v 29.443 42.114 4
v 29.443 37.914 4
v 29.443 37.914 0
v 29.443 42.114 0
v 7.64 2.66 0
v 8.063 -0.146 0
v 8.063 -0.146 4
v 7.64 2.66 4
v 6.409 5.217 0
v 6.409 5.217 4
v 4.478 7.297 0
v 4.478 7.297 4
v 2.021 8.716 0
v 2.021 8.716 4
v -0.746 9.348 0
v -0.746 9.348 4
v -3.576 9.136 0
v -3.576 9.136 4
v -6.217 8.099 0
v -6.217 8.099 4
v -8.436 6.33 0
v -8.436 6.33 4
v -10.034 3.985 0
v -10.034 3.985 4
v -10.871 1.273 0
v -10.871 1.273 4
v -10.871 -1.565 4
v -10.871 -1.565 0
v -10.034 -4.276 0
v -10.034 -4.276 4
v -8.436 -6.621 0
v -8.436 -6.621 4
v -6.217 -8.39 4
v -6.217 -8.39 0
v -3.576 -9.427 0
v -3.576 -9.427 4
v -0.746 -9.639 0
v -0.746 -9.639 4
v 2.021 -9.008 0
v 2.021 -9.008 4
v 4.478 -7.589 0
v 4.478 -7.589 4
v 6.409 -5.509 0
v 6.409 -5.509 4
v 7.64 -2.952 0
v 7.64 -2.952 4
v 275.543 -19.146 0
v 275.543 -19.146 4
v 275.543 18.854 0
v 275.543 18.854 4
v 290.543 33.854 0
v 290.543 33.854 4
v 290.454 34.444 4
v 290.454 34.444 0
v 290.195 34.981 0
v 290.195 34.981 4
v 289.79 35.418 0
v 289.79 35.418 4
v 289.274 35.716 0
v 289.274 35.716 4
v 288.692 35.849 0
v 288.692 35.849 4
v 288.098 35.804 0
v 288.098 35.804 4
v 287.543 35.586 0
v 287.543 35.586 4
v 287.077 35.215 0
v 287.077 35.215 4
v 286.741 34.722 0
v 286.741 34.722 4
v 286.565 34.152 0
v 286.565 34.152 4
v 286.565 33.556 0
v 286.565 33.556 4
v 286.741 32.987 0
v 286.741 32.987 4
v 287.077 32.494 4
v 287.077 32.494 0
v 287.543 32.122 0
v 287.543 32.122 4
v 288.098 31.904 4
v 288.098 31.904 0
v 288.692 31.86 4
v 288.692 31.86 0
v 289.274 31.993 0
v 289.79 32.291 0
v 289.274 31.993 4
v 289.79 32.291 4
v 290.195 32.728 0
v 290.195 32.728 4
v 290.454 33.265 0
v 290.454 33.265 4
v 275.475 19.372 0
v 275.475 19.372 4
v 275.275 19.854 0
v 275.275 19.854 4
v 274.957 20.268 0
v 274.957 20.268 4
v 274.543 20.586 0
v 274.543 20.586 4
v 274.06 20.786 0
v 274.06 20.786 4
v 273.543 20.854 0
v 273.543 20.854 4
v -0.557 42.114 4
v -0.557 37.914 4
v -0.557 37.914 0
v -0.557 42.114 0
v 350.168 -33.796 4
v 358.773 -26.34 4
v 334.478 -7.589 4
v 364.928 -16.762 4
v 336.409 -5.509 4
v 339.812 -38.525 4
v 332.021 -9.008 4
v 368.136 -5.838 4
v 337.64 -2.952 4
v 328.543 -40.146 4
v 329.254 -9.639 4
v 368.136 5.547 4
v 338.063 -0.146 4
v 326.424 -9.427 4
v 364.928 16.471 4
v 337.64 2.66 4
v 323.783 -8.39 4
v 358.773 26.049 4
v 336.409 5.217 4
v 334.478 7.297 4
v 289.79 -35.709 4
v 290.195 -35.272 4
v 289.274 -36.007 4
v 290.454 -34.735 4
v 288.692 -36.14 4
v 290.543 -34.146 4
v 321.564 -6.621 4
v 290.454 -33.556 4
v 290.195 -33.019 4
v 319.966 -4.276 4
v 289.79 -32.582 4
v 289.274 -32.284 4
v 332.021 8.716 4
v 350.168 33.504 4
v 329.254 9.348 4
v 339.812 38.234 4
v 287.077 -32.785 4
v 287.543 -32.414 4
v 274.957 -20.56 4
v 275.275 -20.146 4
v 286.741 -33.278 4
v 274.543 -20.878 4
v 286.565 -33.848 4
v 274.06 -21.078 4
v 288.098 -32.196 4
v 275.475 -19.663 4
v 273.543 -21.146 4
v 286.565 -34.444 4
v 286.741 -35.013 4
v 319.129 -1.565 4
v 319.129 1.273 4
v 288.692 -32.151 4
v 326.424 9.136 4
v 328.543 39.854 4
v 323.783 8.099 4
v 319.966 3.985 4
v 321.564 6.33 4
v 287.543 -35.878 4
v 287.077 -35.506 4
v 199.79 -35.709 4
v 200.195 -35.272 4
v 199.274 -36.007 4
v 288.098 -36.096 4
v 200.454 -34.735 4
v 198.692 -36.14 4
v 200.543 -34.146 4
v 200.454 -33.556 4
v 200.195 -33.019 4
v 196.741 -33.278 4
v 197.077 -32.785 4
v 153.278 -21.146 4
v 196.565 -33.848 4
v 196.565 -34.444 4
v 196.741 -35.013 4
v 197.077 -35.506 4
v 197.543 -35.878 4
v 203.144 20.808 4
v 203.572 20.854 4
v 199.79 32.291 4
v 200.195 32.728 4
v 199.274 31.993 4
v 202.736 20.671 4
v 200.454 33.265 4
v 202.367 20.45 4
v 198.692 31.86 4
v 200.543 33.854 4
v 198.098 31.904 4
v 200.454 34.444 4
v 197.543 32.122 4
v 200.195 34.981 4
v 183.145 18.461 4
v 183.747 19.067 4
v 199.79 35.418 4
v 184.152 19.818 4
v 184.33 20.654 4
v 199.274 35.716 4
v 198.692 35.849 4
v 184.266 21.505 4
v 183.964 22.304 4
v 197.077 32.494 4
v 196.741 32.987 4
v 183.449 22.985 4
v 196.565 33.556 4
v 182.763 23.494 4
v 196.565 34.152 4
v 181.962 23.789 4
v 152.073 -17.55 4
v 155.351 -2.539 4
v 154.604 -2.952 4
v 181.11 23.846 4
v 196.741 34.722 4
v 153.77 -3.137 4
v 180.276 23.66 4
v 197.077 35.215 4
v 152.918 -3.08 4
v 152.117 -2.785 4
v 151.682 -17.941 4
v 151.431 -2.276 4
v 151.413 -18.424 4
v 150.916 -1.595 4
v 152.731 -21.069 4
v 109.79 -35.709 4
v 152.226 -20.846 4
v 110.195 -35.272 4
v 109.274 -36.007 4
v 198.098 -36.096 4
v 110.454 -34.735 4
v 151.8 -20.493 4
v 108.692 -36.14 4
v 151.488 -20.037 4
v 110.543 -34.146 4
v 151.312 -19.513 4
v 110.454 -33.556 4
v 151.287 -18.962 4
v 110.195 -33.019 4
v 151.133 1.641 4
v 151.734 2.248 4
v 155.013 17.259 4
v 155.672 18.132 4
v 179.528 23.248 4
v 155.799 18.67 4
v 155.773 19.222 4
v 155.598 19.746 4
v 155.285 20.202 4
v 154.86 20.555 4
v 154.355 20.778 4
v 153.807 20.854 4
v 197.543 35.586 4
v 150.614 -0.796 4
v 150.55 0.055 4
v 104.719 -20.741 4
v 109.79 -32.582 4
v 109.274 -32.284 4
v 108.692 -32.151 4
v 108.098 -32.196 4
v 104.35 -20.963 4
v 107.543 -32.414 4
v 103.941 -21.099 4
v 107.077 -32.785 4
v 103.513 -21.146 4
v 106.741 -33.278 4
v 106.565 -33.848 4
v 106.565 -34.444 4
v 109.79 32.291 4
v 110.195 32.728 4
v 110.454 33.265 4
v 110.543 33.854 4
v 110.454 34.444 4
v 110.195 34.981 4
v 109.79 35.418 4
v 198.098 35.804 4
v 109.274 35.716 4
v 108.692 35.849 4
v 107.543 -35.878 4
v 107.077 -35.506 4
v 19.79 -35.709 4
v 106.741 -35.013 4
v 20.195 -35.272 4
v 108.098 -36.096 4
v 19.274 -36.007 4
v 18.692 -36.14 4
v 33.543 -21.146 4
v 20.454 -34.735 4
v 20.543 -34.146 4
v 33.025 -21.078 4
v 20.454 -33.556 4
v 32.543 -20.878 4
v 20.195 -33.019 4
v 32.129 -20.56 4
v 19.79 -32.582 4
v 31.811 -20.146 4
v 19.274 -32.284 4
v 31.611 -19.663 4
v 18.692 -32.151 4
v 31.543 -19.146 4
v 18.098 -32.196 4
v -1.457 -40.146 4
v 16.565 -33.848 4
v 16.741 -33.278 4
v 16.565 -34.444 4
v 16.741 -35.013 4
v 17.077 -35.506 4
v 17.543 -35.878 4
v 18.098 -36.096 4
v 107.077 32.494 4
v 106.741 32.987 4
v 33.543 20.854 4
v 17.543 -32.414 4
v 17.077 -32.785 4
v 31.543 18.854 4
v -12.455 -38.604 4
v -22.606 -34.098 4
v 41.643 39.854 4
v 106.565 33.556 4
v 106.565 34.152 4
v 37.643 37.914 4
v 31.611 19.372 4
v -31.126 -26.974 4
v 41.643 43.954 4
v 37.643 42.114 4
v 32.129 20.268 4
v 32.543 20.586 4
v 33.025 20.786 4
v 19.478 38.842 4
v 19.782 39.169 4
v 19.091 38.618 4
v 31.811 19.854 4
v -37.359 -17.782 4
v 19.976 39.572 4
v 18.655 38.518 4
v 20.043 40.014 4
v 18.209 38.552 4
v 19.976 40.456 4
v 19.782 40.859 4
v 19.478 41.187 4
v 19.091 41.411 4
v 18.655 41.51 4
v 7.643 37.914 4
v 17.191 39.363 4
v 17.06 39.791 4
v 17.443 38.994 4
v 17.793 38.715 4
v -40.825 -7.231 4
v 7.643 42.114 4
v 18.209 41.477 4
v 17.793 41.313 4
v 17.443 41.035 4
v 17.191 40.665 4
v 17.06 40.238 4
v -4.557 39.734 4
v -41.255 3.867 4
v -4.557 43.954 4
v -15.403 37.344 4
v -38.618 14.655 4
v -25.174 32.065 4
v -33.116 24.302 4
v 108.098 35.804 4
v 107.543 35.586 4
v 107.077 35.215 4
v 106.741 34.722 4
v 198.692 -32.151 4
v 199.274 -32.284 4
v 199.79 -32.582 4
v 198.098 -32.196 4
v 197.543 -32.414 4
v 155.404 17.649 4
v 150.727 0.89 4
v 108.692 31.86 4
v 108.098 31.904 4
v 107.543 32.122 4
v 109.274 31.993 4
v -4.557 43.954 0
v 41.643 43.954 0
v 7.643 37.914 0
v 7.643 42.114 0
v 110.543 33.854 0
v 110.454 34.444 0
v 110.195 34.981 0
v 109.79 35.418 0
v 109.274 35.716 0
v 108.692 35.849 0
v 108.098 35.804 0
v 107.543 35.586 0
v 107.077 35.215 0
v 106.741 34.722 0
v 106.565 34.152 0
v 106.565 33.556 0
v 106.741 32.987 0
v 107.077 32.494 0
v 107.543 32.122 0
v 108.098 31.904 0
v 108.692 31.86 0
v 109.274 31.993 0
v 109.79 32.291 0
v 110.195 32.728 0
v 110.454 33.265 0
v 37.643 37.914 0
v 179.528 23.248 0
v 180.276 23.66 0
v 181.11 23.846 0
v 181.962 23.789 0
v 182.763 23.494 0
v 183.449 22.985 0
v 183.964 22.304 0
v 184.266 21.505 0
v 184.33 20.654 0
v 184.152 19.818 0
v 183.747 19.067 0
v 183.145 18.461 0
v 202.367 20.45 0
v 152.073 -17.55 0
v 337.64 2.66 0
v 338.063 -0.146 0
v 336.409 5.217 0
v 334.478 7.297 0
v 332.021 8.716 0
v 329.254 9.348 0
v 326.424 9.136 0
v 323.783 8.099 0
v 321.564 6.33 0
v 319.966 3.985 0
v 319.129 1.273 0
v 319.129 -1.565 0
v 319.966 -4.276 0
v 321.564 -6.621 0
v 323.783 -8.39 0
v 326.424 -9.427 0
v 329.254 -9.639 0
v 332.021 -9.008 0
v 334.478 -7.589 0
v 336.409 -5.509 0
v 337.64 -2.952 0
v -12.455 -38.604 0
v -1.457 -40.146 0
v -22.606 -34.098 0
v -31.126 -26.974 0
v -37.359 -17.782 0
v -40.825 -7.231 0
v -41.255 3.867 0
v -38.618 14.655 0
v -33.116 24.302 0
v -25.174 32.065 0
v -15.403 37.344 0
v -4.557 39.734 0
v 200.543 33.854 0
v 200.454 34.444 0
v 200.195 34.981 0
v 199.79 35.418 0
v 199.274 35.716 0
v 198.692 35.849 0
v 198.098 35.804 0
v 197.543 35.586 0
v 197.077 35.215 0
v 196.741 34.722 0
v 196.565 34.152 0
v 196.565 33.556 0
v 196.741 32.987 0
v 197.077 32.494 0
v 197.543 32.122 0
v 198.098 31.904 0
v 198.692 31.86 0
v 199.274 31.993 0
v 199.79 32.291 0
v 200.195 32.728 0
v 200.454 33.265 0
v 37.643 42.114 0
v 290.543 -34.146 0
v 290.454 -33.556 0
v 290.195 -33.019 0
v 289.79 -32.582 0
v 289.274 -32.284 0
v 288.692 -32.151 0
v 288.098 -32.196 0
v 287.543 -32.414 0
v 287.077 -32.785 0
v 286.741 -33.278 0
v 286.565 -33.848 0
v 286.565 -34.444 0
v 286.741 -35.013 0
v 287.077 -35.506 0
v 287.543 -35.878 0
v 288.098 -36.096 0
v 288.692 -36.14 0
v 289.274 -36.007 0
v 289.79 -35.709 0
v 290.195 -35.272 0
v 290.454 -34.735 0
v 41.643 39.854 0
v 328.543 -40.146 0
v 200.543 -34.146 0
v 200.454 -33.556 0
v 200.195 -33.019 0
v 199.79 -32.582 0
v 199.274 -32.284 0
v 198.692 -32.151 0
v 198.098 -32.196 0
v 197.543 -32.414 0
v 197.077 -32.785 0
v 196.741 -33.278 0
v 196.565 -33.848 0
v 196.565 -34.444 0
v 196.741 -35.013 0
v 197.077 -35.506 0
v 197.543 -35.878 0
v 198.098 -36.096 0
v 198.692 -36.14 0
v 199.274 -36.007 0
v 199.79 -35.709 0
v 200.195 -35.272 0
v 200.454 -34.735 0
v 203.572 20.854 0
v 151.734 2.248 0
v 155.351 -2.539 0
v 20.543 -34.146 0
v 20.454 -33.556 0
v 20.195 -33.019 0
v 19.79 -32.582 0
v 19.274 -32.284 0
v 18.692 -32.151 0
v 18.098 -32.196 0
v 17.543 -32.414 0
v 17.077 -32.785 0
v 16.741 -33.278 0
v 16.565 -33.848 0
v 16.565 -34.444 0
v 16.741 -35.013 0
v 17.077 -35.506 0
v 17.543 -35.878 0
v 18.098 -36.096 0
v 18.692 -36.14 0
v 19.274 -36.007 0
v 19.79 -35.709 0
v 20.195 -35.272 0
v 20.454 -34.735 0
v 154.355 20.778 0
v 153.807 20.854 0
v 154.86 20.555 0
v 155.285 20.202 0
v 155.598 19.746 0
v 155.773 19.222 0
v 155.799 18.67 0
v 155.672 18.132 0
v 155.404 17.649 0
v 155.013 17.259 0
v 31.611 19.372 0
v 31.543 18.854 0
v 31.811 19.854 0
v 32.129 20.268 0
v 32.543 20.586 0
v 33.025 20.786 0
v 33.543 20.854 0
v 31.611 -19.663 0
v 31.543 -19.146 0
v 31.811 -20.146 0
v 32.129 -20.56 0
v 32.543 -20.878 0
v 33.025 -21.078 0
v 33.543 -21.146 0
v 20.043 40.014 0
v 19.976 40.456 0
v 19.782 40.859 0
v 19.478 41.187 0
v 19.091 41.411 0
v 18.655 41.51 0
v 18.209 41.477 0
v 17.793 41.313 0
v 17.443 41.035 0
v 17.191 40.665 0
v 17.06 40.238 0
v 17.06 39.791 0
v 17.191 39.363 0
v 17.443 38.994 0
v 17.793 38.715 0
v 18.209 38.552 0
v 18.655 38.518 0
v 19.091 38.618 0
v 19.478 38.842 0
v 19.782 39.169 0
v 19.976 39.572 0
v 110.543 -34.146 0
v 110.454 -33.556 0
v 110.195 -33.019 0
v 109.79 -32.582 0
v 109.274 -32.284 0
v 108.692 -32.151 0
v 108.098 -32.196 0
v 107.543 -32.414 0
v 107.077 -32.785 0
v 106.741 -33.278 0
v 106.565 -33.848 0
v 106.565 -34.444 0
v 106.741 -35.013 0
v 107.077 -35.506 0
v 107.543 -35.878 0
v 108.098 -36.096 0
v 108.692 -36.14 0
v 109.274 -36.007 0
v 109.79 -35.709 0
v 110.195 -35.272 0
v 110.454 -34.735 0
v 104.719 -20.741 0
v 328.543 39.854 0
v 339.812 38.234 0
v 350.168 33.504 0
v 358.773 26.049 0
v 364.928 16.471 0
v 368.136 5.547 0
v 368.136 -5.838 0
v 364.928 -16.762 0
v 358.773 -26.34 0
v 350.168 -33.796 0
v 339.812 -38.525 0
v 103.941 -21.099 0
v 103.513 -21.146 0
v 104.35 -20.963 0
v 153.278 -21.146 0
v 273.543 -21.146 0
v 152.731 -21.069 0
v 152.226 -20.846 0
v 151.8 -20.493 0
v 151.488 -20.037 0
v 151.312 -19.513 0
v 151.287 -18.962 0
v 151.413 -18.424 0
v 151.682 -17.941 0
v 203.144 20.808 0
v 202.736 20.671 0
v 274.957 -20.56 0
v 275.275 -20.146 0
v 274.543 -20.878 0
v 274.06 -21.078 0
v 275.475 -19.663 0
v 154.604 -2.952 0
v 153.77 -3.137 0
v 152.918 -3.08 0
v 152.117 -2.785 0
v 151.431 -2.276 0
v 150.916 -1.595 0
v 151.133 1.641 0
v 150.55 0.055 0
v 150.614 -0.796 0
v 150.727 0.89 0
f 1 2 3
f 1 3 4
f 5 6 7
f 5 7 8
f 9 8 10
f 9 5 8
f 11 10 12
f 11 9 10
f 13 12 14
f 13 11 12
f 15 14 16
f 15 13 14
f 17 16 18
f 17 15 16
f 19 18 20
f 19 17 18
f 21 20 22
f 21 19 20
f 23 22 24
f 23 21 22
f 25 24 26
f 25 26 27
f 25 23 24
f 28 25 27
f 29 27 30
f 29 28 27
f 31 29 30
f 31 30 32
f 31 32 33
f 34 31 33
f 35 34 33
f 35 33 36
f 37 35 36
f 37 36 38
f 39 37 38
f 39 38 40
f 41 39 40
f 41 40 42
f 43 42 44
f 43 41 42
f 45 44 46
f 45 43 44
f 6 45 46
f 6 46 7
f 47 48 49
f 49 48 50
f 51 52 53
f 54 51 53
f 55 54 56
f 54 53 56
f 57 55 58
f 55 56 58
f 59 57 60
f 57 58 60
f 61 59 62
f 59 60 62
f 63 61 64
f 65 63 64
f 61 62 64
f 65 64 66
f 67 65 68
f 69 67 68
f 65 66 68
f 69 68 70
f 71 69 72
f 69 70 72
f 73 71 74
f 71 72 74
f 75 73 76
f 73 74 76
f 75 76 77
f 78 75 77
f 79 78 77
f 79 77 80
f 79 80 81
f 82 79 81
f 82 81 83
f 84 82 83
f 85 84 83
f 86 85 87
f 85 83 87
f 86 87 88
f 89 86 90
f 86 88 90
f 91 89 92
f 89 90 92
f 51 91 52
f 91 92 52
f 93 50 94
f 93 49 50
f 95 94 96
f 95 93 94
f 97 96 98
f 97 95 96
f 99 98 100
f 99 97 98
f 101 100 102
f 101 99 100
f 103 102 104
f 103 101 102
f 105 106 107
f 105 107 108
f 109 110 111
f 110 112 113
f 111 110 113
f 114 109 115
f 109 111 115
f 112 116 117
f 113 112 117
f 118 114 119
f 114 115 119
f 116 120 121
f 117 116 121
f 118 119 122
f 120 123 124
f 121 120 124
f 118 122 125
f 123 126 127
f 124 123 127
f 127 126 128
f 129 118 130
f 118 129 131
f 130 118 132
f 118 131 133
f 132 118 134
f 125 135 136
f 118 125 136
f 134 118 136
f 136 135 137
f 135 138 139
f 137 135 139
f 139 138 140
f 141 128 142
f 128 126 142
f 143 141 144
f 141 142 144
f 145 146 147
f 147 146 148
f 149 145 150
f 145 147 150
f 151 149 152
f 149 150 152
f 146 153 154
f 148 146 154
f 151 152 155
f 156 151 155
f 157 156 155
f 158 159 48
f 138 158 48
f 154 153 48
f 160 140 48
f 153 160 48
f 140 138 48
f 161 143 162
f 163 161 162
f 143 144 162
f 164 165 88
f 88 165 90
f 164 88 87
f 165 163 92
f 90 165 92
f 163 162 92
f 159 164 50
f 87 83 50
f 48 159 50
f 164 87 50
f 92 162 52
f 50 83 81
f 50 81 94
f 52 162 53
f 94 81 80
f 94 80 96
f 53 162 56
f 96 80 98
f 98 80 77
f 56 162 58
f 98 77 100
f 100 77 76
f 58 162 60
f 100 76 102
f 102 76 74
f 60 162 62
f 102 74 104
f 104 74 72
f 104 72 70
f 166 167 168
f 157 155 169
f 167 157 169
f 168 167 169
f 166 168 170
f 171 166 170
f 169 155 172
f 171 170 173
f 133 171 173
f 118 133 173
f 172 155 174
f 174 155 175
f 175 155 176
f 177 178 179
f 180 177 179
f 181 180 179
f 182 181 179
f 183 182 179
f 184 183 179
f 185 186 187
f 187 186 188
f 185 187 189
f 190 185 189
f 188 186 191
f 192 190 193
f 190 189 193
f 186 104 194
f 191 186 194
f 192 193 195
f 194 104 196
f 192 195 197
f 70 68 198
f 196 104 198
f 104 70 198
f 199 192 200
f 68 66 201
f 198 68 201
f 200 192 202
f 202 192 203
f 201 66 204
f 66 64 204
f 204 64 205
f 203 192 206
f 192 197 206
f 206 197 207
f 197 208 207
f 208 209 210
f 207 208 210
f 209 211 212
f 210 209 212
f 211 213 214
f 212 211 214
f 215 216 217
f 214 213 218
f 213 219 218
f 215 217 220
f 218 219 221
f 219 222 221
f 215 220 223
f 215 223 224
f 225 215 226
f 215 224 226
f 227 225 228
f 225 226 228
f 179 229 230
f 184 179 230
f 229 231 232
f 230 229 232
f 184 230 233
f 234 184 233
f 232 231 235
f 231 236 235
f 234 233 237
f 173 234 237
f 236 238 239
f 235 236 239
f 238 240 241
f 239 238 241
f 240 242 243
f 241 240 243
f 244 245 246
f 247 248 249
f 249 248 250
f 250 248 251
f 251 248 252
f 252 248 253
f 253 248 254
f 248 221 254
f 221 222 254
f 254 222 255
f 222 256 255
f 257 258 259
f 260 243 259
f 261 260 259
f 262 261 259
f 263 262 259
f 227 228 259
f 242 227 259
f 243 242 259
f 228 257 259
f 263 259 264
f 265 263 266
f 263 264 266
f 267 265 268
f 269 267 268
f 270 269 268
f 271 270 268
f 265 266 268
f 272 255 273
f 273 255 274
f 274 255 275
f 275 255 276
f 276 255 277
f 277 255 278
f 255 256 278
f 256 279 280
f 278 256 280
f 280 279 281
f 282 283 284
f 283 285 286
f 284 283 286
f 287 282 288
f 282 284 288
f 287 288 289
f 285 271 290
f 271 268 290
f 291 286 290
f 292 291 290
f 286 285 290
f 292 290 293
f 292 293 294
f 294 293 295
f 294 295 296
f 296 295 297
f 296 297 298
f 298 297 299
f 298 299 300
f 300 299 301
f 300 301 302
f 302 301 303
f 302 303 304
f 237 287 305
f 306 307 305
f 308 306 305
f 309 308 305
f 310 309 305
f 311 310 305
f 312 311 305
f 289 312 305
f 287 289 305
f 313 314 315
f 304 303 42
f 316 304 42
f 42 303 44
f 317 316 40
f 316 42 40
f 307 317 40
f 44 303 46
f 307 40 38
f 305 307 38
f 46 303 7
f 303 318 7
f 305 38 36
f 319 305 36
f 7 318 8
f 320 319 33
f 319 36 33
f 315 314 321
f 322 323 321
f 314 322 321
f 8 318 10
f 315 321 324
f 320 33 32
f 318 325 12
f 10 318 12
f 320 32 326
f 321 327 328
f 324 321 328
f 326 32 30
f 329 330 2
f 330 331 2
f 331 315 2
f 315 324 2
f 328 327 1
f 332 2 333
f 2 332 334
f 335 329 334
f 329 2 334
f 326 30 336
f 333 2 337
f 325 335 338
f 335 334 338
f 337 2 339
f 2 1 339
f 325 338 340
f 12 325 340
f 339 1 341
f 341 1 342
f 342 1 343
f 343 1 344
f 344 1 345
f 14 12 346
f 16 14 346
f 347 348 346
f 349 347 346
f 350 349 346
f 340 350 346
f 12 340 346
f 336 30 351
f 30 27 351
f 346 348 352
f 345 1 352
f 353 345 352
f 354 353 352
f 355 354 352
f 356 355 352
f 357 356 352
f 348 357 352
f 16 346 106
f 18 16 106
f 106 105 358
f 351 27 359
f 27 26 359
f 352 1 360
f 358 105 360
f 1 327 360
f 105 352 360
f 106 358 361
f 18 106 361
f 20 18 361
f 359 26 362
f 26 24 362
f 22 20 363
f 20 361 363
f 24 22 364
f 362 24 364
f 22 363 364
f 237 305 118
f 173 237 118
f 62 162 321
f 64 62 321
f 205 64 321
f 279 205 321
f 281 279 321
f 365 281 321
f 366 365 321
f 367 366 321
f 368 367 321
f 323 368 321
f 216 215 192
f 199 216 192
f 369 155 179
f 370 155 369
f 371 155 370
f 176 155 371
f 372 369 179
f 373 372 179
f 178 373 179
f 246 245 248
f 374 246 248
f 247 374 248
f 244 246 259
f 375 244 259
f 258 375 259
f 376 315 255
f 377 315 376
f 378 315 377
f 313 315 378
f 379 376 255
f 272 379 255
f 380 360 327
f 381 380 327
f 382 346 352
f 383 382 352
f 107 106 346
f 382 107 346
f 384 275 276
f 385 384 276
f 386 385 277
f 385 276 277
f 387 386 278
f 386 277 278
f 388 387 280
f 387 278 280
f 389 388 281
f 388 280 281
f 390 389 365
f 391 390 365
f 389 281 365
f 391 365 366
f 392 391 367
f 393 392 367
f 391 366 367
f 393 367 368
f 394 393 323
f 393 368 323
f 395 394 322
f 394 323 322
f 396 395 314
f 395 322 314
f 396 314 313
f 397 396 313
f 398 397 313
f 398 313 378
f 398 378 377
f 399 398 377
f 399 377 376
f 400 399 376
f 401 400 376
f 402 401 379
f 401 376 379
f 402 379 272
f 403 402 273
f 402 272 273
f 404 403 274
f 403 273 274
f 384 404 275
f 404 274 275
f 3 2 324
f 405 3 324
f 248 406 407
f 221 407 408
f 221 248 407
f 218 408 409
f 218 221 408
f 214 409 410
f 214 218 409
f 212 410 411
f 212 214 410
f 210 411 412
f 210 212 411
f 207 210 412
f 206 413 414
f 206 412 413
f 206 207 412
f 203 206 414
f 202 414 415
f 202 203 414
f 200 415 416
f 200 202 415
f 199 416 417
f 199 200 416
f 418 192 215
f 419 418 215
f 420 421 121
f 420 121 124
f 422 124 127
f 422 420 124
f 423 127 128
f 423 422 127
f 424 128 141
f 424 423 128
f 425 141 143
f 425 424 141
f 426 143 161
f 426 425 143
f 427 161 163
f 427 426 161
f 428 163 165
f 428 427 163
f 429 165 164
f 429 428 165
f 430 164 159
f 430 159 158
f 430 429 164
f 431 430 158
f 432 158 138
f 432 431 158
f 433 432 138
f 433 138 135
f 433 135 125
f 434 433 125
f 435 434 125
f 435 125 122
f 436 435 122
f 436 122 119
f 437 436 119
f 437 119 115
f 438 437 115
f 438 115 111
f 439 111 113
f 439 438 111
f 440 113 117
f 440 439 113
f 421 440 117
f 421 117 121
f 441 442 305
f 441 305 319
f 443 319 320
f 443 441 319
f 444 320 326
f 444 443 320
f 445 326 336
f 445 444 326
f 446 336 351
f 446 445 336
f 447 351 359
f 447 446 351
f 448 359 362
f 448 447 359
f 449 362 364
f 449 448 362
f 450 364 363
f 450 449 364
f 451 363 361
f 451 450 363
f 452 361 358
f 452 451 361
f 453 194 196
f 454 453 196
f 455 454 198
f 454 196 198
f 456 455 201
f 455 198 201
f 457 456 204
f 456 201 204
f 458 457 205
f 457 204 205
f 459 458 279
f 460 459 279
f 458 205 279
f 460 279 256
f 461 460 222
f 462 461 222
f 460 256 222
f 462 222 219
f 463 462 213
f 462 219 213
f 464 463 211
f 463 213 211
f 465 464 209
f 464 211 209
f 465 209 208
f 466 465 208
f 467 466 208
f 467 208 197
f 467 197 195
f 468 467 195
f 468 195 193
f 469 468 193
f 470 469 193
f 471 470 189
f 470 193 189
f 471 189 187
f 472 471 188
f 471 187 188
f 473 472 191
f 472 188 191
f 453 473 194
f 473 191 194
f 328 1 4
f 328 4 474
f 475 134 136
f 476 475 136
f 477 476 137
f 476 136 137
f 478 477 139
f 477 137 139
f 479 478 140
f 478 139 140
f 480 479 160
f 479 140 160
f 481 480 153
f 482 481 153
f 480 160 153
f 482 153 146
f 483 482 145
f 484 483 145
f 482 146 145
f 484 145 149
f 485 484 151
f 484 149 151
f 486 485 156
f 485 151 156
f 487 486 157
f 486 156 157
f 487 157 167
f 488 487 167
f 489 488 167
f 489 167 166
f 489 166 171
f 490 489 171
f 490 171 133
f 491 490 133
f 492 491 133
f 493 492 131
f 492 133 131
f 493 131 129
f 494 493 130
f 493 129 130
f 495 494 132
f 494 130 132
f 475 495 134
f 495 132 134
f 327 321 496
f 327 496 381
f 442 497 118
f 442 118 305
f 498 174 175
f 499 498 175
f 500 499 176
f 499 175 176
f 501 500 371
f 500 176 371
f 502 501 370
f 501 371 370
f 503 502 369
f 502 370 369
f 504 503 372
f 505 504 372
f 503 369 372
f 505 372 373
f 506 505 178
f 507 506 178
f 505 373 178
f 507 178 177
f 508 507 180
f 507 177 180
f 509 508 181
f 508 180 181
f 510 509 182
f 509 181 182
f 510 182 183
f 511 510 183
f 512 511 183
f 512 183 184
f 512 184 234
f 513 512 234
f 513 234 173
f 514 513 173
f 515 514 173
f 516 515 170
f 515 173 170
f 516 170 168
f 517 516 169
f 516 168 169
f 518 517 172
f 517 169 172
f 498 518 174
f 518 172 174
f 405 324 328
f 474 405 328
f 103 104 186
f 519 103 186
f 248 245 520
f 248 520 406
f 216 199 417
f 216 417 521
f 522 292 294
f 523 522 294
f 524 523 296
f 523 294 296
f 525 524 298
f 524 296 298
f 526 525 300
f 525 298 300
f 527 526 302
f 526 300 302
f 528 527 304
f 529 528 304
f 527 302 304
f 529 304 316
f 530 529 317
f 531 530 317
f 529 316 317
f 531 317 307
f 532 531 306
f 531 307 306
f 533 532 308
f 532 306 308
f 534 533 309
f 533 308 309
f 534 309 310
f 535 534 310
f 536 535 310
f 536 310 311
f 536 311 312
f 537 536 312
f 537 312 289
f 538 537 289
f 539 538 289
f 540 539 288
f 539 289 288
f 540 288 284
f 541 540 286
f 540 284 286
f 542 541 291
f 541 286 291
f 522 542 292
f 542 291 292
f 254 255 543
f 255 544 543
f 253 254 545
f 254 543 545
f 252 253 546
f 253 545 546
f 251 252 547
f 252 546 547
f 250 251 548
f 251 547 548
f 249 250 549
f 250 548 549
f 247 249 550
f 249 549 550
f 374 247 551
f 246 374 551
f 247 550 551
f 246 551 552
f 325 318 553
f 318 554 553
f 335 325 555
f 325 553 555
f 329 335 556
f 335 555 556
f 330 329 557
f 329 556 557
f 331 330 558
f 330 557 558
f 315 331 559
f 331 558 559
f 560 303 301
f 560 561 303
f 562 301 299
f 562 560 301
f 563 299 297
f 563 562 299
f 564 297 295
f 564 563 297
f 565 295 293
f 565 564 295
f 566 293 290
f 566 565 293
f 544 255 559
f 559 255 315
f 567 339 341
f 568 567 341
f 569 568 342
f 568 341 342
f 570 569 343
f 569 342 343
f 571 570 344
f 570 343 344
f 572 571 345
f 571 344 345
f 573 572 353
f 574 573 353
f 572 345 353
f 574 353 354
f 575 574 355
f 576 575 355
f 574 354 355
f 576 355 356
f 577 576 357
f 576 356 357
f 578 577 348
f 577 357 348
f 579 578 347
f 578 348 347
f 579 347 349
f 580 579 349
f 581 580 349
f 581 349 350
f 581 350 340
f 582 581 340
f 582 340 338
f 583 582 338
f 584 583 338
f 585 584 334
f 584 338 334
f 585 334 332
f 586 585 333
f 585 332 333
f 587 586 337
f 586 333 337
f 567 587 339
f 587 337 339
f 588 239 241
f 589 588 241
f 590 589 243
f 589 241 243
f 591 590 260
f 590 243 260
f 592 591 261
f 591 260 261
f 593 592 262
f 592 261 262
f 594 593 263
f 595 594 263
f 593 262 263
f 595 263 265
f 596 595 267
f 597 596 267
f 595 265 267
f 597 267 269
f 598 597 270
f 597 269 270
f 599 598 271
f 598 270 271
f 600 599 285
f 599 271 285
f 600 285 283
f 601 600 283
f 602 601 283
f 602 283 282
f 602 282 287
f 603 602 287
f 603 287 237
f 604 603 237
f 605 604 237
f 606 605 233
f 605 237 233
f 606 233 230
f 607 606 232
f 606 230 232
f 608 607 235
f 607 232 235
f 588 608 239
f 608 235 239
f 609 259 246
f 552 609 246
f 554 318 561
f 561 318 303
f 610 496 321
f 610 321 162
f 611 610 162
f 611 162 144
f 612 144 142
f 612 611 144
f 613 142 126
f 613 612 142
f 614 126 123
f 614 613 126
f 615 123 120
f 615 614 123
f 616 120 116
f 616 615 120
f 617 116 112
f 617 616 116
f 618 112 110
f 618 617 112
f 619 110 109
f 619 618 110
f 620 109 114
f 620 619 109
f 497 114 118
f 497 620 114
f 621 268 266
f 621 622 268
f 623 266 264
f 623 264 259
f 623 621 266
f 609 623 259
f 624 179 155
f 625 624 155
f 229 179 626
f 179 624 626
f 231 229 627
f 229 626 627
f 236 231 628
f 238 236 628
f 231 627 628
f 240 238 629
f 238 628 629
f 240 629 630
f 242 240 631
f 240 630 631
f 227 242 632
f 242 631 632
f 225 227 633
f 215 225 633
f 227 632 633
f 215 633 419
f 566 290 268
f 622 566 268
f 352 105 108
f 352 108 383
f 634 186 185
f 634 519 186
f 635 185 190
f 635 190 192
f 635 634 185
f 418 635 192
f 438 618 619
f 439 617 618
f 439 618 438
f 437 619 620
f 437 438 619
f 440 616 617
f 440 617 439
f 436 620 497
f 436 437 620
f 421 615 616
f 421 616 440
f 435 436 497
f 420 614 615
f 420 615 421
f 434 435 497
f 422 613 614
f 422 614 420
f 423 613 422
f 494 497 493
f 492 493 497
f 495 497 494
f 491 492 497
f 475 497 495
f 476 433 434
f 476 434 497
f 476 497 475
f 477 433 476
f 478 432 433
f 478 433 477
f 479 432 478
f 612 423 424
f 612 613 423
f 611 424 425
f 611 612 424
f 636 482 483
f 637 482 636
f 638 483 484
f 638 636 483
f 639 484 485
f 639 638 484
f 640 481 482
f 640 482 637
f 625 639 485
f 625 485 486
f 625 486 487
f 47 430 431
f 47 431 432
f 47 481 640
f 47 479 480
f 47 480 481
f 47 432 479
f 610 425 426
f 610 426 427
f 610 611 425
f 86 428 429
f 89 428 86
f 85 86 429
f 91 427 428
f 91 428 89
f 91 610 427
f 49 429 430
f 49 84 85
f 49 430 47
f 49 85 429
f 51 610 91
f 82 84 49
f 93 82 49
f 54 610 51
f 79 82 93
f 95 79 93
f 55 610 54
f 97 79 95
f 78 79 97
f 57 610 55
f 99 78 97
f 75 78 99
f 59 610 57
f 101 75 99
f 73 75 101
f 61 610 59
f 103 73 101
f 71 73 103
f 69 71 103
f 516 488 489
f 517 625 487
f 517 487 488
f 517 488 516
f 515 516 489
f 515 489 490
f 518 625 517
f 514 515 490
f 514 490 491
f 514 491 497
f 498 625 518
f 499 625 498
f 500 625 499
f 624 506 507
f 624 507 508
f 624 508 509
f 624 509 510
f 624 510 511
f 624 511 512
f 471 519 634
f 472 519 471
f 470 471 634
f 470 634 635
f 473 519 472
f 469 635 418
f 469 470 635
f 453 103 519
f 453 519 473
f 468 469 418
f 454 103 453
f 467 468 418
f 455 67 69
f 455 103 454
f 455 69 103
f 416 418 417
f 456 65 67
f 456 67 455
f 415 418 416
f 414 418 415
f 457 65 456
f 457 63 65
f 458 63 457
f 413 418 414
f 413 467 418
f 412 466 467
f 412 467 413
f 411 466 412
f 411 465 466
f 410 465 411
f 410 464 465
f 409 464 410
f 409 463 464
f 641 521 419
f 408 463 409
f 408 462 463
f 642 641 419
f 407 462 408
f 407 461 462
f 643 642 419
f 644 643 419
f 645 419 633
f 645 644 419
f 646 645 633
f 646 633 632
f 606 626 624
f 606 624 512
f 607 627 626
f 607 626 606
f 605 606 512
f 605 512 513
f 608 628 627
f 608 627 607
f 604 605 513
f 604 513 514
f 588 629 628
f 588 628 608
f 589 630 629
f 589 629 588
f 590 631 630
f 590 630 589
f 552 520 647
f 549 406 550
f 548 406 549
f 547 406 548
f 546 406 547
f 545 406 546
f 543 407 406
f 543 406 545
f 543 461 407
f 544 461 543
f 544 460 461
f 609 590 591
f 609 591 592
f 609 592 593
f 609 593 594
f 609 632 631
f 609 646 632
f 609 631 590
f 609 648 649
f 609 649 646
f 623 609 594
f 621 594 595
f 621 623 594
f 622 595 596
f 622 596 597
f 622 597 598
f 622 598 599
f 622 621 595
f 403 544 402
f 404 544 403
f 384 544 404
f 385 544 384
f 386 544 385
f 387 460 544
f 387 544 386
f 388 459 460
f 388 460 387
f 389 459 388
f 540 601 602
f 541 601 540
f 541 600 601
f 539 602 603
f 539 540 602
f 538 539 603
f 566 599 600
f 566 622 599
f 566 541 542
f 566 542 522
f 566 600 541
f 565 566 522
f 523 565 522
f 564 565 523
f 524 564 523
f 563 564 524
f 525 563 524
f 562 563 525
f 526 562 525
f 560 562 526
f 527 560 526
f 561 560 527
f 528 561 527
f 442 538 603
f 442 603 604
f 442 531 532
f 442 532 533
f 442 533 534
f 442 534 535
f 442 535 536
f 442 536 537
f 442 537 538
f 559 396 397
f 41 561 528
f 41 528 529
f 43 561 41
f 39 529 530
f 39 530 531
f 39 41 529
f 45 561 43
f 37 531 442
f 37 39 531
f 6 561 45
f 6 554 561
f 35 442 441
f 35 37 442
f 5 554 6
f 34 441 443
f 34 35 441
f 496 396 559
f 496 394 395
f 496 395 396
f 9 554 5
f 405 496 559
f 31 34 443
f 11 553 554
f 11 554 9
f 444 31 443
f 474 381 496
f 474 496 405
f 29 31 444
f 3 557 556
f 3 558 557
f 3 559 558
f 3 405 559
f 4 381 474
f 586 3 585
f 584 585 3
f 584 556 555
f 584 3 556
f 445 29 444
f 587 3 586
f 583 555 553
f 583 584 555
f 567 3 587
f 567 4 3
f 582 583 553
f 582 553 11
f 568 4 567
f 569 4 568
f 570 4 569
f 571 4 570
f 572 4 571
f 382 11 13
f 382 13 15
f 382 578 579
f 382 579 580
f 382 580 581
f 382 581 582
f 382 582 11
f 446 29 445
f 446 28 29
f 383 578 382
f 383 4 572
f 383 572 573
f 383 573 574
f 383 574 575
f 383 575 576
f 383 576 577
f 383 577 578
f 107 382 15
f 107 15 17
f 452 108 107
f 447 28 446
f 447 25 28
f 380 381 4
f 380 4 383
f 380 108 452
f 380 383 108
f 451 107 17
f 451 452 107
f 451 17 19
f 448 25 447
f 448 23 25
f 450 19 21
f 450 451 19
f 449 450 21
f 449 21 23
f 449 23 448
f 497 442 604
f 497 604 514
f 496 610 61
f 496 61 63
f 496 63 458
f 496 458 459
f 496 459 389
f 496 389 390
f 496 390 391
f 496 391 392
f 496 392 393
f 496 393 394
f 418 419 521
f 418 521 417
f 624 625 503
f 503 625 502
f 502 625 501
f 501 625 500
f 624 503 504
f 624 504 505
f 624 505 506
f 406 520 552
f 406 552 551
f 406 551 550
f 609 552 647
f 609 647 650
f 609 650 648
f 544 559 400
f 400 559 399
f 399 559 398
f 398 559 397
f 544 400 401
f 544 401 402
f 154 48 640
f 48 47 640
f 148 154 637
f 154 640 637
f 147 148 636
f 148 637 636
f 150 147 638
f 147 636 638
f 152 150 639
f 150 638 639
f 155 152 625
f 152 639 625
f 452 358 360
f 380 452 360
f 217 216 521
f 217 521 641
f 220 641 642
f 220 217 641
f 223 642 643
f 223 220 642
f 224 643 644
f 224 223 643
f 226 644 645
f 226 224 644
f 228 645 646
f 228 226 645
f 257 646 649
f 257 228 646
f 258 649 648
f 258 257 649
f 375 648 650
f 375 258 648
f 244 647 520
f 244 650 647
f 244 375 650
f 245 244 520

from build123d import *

# Parameters (mm, degrees)
SKETCH_1_R          = 9.52
EXTRUDE_1_DEPTH     = 4
SKETCH_4_W          = 46.2
SKETCH_4_H          = 8.602857229
EXTRUDE_2_DEPTH     = 4
SKETCH_2_R          = 2
SKETCH_2_R_2        = 1.5
SKETCH_2_W          = 8.2
SKETCH_2_H          = 4.2
CUT_EXTRUDE_1_DEPTH = 4
CUT_EXTRUDE_2_DEPTH = 10
FILLET_1_R          = 2


with BuildPart() as part:
    # 草图1 → 凸台-拉伸1 (new body)
    with BuildSketch(Plane.XY):
        with BuildLine():
            Line((328.542857143, -40.145714286), (-1.457142857, -40.145714286))
            ThreePointArc((-1.457142857, -40.145714286), (-41.457142857, -0.145714286), (-1.457142857, 39.854285714))
            Line((-1.457142857, 39.854285714), (328.542857143, 39.854285714))
            ThreePointArc((328.542857143, 39.854285714), (368.542857143, -0.145714286), (328.542857143, -40.145714286))
        make_face()
        with Locations((-1.457142857, -0.145714286)):
            Circle(SKETCH_1_R, mode=Mode.SUBTRACT)
        with Locations((328.542857143, -0.145714286)):
            Circle(SKETCH_1_R, mode=Mode.SUBTRACT)
    extrude(amount=EXTRUDE_1_DEPTH)

    # 草图4 → 凸台-拉伸2 (add)
    with BuildSketch(Plane.XY.offset(4)):
        with Locations((18.542857143, 39.652857099)):
            Rectangle(SKETCH_4_W, SKETCH_4_H)
    extrude(amount=-EXTRUDE_2_DEPTH)

    # 草图2 → 切除-拉伸1 (cut)
    with BuildSketch(Plane.XY.offset(4)):
        with Locations((108.542857143, 33.854285714)):
            Circle(SKETCH_2_R)
        with Locations((198.542857143, 33.854285714)):
            Circle(SKETCH_2_R)
        with Locations((288.542857143, 33.854285714)):
            Circle(SKETCH_2_R)
        with Locations((108.542857143, -34.145714286)):
            Circle(SKETCH_2_R)
        with Locations((198.542857143, -34.145714286)):
            Circle(SKETCH_2_R)
        with Locations((288.542857143, -34.145714286)):
            Circle(SKETCH_2_R)
        with Locations((18.542857143, -34.145714286)):
            Circle(SKETCH_2_R)
        with Locations((18.542857143, 40.014285714)):
            Circle(SKETCH_2_R_2)
        Polygon((31.542857143, -21.145714286), (104.183898028, -21.145714286), (159.772133322, 20.854285714), (31.542857143, 20.854285714), align=None)
        Polygon((275.542857143, 20.854285714), (202.901816258, 20.854285714), (147.313580964, -21.145714286), (275.542857143, -21.145714286), align=None)
        with Locations((33.542857143, 40.014285714)):
            Rectangle(SKETCH_2_W, SKETCH_2_H)
        with Locations((3.542857143, 40.014285714)):
            Rectangle(SKETCH_2_W, SKETCH_2_H)
    extrude(amount=-CUT_EXTRUDE_1_DEPTH, mode=Mode.SUBTRACT)

    # 草图3 → 切除-拉伸2 (cut)
    with BuildSketch(Plane.XY.offset(4)):
        with BuildLine():
            Line((183.145474057, 18.460683743), (155.35135641, -2.539316257))
            ThreePointArc((155.35135641, -2.539316257), (151.149255171, -1.954213553), (151.734357875, 2.247887686))
            Line((151.734357875, 2.247887686), (179.528475522, 23.247887686))
            ThreePointArc((179.528475522, 23.247887686), (183.730576762, 22.662784982), (183.145474057, 18.460683743))
        make_face()
    extrude(amount=-CUT_EXTRUDE_2_DEPTH, mode=Mode.SUBTRACT)

    # 圆角1
    fillet_1_edges = [part.edges().sort_by_distance(p)[0] for p in [
        (31.542857143, -21.145714286, 2),
        (31.542857143, 20.854285714, 2),
        (159.772133322, 20.854285714, 2),
        (104.183898028, -21.145714286, 2),
        (275.542857143, 20.854285714, 2),
        (275.542857143, -21.145714286, 2),
        (147.313580964, -21.145714286, 2),
        (202.901816258, 20.854285714, 2),
    ]]
    fillet(fillet_1_edges, radius=FILLET_1_R)


solid = part.part
